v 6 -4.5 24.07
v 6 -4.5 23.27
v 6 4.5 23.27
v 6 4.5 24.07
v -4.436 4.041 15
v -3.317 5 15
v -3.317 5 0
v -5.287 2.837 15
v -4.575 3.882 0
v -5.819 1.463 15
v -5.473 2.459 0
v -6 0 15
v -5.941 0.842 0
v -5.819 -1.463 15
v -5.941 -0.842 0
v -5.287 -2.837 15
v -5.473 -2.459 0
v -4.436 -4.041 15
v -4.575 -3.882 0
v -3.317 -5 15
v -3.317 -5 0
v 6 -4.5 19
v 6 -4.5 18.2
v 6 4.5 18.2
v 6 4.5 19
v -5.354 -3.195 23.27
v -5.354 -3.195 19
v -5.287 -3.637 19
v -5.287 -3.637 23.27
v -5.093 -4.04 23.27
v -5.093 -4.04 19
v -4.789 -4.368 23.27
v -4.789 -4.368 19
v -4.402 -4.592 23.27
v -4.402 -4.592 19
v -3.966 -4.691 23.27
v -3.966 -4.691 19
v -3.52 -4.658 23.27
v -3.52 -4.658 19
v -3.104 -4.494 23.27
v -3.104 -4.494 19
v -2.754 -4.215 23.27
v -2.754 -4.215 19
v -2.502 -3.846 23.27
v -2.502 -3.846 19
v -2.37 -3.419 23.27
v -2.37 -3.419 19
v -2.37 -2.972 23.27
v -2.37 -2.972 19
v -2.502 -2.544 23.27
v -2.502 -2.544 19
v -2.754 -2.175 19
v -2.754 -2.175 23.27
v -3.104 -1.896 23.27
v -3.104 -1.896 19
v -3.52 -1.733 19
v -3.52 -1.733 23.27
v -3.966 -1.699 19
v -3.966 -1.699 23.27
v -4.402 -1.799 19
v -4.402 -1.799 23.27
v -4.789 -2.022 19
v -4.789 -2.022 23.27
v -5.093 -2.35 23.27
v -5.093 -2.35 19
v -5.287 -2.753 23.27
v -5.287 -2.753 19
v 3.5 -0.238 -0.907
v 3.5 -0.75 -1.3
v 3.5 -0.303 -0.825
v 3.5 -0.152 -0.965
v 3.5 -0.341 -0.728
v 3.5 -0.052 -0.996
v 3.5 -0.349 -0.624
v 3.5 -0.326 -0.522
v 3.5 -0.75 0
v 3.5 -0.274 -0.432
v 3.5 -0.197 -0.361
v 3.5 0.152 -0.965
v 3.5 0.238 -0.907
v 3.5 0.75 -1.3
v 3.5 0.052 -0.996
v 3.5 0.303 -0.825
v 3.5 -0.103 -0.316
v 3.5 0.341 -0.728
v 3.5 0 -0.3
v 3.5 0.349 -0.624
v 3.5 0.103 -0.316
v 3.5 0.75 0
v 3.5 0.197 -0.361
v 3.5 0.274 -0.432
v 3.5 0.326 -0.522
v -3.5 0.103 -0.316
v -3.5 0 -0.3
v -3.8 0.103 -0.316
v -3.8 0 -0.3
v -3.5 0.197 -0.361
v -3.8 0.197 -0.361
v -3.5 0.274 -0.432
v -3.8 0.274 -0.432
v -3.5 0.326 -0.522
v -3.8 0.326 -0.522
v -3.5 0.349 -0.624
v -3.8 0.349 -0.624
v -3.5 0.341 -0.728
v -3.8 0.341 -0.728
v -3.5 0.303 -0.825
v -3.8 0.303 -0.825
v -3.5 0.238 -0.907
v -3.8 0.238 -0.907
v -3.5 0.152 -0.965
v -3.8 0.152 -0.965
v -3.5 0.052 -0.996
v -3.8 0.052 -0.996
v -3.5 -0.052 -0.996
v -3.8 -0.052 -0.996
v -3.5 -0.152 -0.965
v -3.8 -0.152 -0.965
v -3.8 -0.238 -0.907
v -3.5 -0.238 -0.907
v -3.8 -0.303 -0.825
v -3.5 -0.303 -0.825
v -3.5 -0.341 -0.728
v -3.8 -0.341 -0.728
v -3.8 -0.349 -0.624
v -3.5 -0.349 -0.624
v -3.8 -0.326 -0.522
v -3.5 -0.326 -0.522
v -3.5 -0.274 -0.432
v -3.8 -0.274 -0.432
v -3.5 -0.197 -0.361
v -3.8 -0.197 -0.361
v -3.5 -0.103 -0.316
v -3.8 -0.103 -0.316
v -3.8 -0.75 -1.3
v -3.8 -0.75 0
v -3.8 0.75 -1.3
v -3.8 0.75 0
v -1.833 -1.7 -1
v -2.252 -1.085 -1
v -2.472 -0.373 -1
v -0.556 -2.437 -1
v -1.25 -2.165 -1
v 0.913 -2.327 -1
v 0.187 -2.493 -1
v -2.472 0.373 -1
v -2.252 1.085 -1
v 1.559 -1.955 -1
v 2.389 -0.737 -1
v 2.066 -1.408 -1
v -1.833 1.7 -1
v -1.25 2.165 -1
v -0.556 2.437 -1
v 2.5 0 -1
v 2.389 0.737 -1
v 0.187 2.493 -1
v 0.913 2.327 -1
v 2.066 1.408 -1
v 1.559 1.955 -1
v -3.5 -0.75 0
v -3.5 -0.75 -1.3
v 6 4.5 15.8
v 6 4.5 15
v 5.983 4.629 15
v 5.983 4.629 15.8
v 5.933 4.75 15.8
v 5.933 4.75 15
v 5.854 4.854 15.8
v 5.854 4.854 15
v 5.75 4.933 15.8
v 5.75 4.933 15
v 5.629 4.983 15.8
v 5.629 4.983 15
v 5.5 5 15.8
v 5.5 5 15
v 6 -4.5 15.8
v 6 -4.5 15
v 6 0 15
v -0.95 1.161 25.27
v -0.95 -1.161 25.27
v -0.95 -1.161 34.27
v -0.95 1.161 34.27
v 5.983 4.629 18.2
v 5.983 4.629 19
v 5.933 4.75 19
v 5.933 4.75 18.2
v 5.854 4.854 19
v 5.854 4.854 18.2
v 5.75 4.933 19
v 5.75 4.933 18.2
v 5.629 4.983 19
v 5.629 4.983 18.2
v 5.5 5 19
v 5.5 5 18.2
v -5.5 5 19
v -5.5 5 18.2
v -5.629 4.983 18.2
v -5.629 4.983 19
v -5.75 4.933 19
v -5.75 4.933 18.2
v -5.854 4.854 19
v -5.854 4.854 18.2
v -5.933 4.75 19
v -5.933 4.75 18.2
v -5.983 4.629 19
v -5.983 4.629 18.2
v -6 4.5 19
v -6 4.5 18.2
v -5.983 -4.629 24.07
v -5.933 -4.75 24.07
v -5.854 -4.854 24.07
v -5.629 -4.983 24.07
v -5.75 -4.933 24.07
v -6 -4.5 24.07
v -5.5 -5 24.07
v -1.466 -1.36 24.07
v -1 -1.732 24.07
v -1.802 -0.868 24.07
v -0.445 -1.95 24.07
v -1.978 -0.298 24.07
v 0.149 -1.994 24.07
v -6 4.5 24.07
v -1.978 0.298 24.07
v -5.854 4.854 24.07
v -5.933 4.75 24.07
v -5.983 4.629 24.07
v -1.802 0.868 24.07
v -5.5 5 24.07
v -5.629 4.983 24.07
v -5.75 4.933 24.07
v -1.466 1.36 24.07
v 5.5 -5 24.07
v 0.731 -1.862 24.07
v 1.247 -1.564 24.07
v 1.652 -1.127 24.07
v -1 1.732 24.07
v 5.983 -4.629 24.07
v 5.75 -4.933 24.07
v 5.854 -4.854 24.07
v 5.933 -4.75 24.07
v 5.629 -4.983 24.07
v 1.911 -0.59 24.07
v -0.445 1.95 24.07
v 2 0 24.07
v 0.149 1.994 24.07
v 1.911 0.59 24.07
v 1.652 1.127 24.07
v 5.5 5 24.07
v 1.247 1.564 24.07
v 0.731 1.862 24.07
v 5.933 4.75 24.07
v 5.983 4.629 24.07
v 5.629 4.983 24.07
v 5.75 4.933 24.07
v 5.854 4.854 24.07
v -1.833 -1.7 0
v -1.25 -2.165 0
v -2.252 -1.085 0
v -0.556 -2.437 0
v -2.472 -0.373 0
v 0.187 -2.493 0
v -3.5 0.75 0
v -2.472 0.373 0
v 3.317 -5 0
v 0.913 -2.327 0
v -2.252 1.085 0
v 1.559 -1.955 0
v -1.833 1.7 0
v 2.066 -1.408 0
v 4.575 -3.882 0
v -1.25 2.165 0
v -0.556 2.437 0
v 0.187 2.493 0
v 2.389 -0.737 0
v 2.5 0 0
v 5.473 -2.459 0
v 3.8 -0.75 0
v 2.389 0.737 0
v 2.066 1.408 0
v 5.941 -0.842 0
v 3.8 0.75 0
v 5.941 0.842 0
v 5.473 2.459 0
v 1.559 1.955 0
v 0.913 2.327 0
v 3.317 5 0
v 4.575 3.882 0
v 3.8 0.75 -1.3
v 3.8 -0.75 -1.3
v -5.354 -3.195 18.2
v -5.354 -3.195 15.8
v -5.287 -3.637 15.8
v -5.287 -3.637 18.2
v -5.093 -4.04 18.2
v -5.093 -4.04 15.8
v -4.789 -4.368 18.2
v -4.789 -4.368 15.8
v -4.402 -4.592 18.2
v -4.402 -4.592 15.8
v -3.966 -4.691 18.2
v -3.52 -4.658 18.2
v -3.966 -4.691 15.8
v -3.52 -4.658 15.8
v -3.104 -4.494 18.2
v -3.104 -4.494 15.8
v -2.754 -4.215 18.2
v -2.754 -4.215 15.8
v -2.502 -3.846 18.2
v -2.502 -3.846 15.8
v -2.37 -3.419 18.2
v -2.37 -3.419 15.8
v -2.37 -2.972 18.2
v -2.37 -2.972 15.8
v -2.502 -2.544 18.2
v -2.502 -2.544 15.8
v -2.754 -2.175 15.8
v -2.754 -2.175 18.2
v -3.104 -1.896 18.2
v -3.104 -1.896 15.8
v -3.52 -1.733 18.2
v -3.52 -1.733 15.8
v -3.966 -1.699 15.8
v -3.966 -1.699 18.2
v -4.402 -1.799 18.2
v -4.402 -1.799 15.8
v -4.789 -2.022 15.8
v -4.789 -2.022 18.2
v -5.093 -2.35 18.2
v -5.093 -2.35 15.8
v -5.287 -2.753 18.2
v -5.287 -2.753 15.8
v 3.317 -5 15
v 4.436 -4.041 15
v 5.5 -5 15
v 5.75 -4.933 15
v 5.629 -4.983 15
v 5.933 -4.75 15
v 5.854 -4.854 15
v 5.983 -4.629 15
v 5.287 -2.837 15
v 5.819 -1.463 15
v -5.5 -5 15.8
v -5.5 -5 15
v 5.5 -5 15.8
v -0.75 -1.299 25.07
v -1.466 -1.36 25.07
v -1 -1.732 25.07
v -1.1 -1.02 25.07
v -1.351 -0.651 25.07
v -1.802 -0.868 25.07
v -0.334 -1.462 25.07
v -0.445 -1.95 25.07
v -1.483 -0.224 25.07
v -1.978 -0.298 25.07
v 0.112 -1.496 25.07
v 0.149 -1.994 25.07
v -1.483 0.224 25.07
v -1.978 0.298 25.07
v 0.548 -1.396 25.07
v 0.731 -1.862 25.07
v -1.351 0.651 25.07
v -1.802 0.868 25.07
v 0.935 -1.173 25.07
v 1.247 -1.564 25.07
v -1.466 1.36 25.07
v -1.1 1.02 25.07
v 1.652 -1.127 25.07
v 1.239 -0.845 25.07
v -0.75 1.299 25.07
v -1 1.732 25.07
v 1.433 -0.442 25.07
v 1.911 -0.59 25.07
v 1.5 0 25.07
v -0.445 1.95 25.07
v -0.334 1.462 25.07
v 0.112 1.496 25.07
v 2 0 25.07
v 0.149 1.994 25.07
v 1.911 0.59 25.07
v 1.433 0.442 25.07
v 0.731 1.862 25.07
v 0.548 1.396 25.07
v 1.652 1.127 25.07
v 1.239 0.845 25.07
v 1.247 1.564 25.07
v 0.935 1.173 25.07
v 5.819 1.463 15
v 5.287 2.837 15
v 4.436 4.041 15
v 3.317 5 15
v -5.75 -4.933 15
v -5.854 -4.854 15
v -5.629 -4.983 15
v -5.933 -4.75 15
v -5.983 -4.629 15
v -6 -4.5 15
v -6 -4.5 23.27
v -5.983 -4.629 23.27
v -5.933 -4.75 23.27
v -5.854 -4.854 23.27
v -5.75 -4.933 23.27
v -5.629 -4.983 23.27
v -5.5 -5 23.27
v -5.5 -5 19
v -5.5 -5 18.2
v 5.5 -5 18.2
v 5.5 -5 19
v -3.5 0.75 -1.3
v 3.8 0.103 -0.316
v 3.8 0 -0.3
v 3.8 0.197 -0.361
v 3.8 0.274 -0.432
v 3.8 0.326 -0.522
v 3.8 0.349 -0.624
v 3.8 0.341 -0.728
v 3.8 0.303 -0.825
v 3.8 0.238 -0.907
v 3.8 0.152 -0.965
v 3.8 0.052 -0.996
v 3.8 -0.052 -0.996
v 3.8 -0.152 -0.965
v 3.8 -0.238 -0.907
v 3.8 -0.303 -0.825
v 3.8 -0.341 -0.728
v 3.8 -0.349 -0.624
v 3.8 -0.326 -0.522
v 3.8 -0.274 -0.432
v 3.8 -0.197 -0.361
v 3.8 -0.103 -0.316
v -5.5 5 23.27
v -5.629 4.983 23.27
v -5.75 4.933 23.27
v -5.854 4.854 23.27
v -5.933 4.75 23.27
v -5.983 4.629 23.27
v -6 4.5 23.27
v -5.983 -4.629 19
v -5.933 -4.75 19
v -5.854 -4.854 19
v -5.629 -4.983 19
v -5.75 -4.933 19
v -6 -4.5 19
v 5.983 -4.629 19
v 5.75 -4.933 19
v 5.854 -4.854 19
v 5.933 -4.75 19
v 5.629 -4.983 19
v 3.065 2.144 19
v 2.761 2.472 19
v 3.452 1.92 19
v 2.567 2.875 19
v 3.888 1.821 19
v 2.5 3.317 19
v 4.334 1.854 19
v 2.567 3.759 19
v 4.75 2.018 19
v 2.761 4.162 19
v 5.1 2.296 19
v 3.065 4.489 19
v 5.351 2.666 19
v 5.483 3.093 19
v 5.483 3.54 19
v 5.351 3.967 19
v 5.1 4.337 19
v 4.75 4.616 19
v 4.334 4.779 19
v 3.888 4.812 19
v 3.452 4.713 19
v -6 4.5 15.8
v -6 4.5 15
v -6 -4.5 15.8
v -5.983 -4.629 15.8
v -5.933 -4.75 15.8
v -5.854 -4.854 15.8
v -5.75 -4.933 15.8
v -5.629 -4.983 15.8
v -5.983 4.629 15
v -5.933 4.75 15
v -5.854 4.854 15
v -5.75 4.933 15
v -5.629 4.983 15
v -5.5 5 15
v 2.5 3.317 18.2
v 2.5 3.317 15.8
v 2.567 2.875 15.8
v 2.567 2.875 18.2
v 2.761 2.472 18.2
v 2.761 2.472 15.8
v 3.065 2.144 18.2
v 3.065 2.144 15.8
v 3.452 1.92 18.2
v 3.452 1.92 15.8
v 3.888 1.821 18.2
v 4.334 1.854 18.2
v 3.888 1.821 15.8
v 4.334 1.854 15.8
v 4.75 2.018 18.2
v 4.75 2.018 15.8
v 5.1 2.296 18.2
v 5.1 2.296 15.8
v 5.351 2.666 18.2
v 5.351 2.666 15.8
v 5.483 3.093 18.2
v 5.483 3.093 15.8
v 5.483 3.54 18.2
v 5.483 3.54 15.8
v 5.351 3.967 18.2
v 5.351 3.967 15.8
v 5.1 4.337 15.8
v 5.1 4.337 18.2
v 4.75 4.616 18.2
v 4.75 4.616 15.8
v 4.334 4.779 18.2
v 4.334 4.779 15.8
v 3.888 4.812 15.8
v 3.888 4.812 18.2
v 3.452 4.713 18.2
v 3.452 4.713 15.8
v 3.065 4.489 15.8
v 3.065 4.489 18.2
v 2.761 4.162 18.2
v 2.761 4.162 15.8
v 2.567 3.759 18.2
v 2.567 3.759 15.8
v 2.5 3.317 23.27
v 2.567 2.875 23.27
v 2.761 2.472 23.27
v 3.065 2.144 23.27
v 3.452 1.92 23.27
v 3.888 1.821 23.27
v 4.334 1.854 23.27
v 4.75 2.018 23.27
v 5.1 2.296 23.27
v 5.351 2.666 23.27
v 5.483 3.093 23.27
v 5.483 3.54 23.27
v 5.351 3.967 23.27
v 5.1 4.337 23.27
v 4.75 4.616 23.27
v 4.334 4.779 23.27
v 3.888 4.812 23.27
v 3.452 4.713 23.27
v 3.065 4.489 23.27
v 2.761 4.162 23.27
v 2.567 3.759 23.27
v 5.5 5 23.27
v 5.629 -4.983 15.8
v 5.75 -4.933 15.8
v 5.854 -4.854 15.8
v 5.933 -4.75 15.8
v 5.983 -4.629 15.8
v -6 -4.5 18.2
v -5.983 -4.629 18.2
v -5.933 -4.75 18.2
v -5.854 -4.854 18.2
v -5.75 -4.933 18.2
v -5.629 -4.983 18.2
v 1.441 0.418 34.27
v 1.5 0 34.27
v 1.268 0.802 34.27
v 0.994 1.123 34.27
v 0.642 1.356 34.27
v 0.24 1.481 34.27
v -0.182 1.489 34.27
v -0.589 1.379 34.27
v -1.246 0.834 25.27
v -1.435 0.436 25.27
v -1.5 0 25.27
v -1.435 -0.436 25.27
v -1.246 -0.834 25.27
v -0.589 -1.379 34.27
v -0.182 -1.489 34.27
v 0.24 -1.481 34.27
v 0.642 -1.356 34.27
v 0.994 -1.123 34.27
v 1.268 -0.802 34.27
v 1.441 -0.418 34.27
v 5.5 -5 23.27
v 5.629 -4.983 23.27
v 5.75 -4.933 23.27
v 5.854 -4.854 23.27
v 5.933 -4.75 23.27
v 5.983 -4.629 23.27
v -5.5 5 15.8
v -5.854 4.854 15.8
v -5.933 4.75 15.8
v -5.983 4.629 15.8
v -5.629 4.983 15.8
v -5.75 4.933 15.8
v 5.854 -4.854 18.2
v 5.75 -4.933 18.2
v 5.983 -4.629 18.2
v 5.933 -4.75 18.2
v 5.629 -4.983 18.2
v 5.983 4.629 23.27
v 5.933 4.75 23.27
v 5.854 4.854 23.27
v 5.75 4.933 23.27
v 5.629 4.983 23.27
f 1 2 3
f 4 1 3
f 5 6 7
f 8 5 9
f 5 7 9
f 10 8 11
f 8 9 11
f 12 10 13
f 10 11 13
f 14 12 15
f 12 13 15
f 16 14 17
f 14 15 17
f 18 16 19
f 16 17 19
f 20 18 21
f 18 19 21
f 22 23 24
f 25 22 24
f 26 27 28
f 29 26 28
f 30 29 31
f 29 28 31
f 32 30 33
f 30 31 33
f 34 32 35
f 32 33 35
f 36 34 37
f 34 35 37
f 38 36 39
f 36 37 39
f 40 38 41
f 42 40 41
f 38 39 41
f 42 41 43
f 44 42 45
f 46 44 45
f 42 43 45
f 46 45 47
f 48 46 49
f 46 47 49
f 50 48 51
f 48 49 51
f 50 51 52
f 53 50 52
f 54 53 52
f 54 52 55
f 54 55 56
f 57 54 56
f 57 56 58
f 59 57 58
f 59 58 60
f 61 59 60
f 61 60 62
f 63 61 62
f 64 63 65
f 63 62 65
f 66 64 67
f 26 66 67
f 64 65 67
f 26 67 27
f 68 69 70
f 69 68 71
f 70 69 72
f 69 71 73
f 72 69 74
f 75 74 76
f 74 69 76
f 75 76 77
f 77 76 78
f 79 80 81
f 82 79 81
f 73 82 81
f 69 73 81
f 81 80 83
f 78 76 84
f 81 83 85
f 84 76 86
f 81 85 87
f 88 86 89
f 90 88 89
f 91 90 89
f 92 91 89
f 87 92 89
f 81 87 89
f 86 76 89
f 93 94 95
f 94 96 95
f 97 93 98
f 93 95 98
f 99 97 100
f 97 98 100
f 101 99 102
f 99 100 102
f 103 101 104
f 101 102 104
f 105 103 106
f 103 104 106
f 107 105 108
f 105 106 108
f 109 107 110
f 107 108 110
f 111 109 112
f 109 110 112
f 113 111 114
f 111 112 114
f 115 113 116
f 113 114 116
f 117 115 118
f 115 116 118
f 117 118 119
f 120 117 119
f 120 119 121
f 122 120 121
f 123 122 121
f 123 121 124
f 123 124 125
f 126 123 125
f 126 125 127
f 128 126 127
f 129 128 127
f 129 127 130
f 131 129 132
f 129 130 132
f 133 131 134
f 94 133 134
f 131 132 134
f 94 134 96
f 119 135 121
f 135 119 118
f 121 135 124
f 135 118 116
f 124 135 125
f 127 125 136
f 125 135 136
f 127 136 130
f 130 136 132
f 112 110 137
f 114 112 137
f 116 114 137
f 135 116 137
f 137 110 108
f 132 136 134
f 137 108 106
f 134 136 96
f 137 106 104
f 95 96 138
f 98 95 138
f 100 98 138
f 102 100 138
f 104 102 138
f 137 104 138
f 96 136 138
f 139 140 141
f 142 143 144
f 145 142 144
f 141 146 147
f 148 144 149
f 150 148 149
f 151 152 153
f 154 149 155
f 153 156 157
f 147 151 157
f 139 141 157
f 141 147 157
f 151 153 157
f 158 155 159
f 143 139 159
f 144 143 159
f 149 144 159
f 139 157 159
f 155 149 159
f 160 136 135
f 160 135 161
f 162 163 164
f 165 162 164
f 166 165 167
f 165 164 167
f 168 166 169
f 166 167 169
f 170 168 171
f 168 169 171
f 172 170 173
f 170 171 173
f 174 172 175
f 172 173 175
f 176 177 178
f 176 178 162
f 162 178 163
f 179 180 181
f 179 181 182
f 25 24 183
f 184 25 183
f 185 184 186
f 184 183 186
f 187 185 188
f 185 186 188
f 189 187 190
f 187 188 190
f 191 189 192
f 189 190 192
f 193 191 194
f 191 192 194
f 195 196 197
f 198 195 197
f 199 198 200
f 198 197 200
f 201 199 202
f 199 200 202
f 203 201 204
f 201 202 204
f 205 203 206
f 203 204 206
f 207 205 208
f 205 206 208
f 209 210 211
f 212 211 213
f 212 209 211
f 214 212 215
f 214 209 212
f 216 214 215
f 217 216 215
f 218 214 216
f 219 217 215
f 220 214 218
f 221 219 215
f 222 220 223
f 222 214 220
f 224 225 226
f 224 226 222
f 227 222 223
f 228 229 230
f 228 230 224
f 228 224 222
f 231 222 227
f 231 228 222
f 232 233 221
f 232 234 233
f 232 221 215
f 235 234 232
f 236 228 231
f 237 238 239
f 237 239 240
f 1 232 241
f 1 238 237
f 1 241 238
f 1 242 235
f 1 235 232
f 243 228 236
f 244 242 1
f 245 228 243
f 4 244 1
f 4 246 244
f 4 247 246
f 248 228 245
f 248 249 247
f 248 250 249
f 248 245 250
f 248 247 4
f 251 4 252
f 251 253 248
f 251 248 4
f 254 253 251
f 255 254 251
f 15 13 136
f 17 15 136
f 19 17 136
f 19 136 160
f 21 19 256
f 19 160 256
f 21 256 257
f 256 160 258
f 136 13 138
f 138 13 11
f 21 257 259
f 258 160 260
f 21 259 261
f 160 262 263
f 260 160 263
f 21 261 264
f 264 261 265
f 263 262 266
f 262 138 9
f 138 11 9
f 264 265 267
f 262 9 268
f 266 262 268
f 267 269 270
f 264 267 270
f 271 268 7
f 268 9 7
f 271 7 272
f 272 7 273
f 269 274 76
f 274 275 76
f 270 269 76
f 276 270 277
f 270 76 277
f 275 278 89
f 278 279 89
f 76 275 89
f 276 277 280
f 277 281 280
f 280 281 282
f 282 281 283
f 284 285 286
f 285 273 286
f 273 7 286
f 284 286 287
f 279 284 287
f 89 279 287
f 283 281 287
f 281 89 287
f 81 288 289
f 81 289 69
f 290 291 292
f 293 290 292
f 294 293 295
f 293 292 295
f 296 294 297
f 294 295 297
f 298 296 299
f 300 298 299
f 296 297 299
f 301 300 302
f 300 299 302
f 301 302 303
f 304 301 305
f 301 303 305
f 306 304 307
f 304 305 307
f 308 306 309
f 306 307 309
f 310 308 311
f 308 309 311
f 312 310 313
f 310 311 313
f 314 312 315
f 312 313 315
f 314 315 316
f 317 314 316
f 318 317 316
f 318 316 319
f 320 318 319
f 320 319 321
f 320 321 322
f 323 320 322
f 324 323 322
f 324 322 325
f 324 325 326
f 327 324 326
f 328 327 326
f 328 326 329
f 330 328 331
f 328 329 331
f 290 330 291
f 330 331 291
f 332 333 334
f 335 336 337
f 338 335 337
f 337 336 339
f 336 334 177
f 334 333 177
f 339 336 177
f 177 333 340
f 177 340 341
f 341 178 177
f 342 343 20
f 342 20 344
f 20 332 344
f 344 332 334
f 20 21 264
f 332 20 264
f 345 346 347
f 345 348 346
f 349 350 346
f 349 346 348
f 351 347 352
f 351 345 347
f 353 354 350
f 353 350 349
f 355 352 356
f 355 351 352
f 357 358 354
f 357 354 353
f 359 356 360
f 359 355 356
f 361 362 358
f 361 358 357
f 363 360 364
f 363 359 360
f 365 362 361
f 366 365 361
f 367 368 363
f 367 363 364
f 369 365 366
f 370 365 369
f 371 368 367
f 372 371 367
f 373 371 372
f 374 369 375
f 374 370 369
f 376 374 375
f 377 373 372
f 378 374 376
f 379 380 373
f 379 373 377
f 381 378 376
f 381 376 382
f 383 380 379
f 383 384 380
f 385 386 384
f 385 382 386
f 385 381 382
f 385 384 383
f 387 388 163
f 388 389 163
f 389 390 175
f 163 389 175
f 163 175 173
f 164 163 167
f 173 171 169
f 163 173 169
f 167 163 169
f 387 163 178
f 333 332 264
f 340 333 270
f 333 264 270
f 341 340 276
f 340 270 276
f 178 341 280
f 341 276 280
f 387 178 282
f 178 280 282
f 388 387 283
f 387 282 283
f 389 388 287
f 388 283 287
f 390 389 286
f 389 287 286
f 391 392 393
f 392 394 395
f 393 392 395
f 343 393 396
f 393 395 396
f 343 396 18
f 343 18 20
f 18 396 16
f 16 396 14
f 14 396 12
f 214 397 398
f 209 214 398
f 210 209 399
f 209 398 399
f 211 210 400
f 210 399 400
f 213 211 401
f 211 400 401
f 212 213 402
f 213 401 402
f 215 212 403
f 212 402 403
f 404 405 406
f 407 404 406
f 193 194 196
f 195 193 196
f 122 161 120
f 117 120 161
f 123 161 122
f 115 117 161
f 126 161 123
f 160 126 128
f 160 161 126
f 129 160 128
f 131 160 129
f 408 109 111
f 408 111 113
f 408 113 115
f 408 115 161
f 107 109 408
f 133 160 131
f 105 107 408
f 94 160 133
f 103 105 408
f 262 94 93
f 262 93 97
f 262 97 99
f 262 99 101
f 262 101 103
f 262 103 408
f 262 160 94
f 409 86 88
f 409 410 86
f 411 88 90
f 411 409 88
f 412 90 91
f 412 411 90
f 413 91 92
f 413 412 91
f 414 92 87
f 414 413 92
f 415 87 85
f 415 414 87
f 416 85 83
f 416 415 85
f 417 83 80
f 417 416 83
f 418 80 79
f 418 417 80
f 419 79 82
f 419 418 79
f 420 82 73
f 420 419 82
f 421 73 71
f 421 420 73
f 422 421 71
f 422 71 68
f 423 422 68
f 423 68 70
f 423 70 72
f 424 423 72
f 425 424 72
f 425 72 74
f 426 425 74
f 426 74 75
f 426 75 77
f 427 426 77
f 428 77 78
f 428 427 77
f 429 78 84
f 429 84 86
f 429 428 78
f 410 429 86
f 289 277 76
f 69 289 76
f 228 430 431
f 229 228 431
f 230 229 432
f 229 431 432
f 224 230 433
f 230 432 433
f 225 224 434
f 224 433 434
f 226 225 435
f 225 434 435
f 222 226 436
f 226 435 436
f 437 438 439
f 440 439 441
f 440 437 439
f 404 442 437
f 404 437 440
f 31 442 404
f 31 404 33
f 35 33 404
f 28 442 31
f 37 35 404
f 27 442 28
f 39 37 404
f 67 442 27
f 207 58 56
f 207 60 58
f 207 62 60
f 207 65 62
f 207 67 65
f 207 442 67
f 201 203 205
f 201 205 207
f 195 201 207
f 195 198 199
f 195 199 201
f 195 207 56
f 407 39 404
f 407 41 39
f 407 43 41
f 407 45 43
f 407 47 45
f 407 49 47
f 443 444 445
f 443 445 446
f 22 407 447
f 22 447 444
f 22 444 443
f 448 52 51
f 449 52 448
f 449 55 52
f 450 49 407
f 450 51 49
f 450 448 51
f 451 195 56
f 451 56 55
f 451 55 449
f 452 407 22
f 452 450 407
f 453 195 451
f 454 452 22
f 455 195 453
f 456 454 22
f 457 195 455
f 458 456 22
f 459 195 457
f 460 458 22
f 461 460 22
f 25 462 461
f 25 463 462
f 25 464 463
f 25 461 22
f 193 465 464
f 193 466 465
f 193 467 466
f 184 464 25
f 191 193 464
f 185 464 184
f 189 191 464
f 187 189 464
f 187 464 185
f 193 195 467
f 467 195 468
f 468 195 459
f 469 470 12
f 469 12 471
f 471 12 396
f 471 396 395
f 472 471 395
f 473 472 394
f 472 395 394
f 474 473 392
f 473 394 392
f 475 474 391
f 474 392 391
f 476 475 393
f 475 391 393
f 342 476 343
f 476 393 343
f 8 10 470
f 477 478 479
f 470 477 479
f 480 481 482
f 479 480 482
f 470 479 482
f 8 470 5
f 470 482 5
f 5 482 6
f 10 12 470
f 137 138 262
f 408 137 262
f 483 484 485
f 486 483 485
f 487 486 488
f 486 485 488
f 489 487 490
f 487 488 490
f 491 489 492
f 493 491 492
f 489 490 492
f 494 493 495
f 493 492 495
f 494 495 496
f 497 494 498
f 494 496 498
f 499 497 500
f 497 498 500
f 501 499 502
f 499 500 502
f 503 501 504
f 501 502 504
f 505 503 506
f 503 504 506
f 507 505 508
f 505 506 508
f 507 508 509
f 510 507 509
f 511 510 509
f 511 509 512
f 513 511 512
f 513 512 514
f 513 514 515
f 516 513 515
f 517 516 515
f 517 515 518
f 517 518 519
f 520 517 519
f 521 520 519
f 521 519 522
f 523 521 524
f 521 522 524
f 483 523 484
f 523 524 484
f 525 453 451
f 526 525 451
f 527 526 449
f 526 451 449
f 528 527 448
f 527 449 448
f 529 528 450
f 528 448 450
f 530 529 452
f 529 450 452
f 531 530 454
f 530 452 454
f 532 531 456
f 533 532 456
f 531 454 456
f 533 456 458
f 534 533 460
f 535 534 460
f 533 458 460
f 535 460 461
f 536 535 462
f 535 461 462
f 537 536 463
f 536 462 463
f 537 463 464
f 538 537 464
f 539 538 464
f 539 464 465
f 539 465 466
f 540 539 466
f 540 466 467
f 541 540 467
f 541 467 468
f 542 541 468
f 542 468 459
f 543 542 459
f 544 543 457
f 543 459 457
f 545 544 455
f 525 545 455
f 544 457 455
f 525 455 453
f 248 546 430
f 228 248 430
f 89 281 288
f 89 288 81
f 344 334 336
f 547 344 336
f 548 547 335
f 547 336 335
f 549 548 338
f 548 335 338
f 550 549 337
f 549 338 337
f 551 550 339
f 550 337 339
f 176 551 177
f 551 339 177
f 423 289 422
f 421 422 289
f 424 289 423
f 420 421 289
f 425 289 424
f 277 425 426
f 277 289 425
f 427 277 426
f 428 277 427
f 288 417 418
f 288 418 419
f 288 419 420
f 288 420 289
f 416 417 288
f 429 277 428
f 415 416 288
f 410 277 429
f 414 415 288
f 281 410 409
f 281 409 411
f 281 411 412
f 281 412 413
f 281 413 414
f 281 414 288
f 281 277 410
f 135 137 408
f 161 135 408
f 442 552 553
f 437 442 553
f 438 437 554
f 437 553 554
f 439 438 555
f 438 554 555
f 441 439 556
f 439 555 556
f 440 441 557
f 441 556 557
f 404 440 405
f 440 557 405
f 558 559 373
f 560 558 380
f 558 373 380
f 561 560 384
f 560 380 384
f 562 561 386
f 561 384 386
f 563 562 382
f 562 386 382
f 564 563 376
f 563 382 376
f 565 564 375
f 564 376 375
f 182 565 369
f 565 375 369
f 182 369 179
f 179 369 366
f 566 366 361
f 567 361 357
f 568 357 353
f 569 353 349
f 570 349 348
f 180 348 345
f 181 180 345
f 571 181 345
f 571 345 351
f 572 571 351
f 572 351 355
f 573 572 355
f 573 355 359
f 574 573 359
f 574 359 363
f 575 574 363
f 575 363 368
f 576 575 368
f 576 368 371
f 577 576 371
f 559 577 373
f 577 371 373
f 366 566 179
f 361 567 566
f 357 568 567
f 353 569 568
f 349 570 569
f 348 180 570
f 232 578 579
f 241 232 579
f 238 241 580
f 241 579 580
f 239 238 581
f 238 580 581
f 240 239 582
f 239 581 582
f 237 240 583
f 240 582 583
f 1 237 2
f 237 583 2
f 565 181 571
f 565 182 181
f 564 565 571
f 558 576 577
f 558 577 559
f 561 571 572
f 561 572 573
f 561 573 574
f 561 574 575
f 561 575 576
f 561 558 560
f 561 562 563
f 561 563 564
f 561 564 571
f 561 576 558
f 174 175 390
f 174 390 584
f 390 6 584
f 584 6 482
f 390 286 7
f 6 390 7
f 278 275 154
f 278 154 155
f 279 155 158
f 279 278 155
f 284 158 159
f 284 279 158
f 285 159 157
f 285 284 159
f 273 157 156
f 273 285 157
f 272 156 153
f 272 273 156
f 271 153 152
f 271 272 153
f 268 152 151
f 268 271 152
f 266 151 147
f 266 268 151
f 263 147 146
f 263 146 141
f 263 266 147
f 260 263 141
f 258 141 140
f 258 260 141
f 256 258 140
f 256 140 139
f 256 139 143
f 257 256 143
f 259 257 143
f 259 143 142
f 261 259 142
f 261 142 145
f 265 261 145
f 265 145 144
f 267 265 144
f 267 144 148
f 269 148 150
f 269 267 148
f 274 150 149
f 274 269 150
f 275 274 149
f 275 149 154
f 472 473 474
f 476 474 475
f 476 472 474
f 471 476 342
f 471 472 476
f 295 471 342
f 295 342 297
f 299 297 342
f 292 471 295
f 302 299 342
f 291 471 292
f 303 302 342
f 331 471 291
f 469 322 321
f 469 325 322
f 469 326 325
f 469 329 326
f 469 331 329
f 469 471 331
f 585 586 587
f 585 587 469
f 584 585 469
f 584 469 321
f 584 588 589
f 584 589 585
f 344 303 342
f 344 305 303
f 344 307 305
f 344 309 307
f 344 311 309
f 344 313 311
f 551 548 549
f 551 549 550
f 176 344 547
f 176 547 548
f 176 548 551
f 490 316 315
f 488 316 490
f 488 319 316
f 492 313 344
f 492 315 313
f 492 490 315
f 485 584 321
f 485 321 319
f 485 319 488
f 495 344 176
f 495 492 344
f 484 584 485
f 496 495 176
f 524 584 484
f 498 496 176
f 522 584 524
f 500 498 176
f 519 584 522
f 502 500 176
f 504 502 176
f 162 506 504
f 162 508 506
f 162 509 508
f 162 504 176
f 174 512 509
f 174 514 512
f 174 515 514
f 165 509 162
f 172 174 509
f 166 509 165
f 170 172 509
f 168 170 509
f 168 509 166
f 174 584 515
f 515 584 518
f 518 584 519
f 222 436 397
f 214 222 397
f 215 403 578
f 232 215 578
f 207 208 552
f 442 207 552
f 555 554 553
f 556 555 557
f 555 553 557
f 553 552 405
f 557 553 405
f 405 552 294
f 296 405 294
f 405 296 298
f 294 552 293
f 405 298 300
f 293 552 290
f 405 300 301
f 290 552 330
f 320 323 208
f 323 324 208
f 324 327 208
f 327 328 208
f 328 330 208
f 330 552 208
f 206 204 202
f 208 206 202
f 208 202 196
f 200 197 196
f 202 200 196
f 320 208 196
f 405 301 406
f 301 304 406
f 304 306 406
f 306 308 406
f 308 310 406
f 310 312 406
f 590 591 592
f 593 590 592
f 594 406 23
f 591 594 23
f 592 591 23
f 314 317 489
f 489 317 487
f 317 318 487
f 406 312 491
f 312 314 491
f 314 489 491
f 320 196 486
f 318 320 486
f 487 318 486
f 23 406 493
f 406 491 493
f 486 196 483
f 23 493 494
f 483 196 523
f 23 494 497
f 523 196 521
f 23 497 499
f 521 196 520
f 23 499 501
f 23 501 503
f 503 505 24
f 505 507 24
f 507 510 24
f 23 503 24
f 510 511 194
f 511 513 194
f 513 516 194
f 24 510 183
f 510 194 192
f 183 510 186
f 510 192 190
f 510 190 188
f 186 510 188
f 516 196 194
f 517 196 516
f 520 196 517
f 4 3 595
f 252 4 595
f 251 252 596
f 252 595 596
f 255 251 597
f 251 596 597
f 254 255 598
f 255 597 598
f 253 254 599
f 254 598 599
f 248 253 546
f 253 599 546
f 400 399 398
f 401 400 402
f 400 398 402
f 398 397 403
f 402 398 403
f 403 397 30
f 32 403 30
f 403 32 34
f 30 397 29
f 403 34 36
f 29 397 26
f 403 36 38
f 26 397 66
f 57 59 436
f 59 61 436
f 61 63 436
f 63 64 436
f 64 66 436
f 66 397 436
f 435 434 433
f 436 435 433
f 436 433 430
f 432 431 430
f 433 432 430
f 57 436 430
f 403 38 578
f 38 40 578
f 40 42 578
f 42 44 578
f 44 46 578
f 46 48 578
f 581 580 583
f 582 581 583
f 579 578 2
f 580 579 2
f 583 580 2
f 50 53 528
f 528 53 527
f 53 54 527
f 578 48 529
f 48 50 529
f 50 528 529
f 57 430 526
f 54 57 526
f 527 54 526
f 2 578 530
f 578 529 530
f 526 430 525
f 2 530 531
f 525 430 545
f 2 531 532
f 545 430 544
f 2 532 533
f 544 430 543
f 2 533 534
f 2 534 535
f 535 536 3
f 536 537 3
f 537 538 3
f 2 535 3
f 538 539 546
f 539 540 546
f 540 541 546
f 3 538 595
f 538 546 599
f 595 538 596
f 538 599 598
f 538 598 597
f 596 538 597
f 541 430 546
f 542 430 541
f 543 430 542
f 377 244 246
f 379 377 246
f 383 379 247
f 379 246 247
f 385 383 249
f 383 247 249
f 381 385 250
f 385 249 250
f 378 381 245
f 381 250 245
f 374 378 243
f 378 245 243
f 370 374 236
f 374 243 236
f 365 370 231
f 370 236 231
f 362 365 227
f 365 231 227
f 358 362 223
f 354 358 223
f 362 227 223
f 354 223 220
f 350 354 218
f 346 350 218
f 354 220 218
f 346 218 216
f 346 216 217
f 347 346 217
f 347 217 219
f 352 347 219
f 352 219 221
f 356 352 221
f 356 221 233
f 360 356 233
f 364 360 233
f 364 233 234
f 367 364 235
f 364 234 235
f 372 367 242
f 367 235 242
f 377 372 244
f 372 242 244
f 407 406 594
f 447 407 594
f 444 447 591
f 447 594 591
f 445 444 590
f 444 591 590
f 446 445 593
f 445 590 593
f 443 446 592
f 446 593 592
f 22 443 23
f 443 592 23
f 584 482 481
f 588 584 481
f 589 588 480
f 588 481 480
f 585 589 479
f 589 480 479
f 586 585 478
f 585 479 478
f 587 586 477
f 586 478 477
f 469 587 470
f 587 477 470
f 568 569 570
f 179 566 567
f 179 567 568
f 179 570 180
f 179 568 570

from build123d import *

# Parameters (mm, degrees)
SALIENTE_EXTRUIR1_DEPTH  = 15
SALIENTE_EXTRUIR2_DEPTH  = 0.8
CROQUIS3_R               = 1.5
SALIENTE_EXTRUIR3_DEPTH  = 2.4
SALIENTE_EXTRUIR4_DEPTH  = 0.8
CROQUIS5_R               = 1.5
SALIENTE_EXTRUIR5_DEPTH  = 4.27
SALIENTE_EXTRUIR6_DEPTH  = 0.8
CROQUIS7_R               = 2
SALIENTE_EXTRUIR7_DEPTH  = 1
CROQUIS8_R               = 1.5
SALIENTE_EXTRUIR8_DEPTH  = 9.2
CORTAR_EXTRUIR1_START    = -9
CORTAR_EXTRUIR1_DEPTH    = 9
CROQUIS1_3_R             = 2.5
SALIENTE_EXTRUIR9_DEPTH  = 1
CROQUIS1_4_W             = 0.3
CROQUIS1_4_H             = 1.5
SALIENTE_EXTRUIR10_DEPTH = 1.3
CORTAR_EXTRUIR2_REACH    = 37.993
CROQUIS10_R              = 0.35


with BuildPart() as part:
    # Croquis1 → Saliente-Extruir1 (new body)
    with BuildSketch(Plane.XY):
        with BuildLine():
            Line((3.31662479, 5), (-3.31662479, 5))
            ThreePointArc((-3.31662479, 5), (-6, 0), (-3.31662479, -5))
            Line((-3.31662479, -5), (3.31662479, -5))
            ThreePointArc((3.31662479, -5), (6, 0), (3.31662479, 5))
        make_face()
    extrude(amount=SALIENTE_EXTRUIR1_DEPTH)

    # Croquis2 → Saliente-Extruir2 (add)
    with BuildSketch(Plane.XY.offset(15)):
        with BuildLine():
            Line((-5.5, -5), (5.5, -5))
            ThreePointArc((5.5, -5), (5.853553391, -4.853553391), (6, -4.5))
            Line((6, -4.5), (6, 4.5))
            ThreePointArc((6, 4.5), (5.853553391, 4.853553391), (5.5, 5))
            Line((5.5, 5), (-5.5, 5))
            ThreePointArc((-5.5, 5), (-5.853553391, 4.853553391), (-6, 4.5))
            Line((-6, 4.5), (-6, -4.5))
            ThreePointArc((-6, -4.5), (-5.853553391, -4.853553391), (-5.5, -5))
        make_face()
    extrude(amount=SALIENTE_EXTRUIR2_DEPTH)

    # Croquis3 → Saliente-Extruir3 (add)
    with BuildSketch(Plane.XY.offset(15.8)):
        with Locations((-3.853553391, -3.195226195)):
            Circle(CROQUIS3_R)
        with Locations((4, 3.316654392)):
            Circle(CROQUIS3_R)
    extrude(amount=SALIENTE_EXTRUIR3_DEPTH)

    # Croquis4 → Saliente-Extruir4 (add)
    with BuildSketch(Plane.XY.offset(18.2)):
        with BuildLine():
            Line((5.5, 5), (-5.5, 5))
            ThreePointArc((-5.5, 5), (-5.853553391, 4.853553391), (-6, 4.5))
            Line((-6, 4.5), (-6, -4.5))
            ThreePointArc((-6, -4.5), (-5.853553391, -4.853553391), (-5.5, -5))
            Line((-5.5, -5), (5.5, -5))
            ThreePointArc((5.5, -5), (5.853553391, -4.853553391), (6, -4.5))
            Line((6, -4.5), (6, 4.5))
            ThreePointArc((6, 4.5), (5.853553391, 4.853553391), (5.5, 5))
        make_face()
    extrude(amount=SALIENTE_EXTRUIR4_DEPTH)

    # Croquis5 → Saliente-Extruir5 (add)
    with BuildSketch(Plane.XY.offset(19)):
        with Locations((4, 3.316654392)):
            Circle(CROQUIS5_R)
        with Locations((-3.853553391, -3.195226195)):
            Circle(CROQUIS5_R)
    extrude(amount=SALIENTE_EXTRUIR5_DEPTH)

    # Croquis6 → Saliente-Extruir6 (add)
    with BuildSketch(Plane.XY.offset(23.27)):
        with BuildLine():
            Line((5.5, 5), (-5.5, 5))
            ThreePointArc((-5.5, 5), (-5.853553391, 4.853553391), (-6, 4.5))
            Line((-6, 4.5), (-6, -4.5))
            ThreePointArc((-6, -4.5), (-5.853553391, -4.853553391), (-5.5, -5))
            Line((-5.5, -5), (5.5, -5))
            ThreePointArc((5.5, -5), (5.853553391, -4.853553391), (6, -4.5))
            Line((6, -4.5), (6, 4.5))
            ThreePointArc((6, 4.5), (5.853553391, 4.853553391), (5.5, 5))
        make_face()
    extrude(amount=SALIENTE_EXTRUIR6_DEPTH)

    # Croquis7 → Saliente-Extruir7 (add)
    with BuildSketch(Plane.XY.offset(24.07)):
        Circle(CROQUIS7_R)
    extrude(amount=SALIENTE_EXTRUIR7_DEPTH)

    # Croquis8 → Saliente-Extruir8 (add)
    with BuildSketch(Plane.XY.offset(25.07)):
        Circle(CROQUIS8_R)
    extrude(amount=SALIENTE_EXTRUIR8_DEPTH)

    # Croquis9 → Cortar-Extruir1 (cut)
    with BuildSketch(Plane.XY.offset(34.27).offset(CORTAR_EXTRUIR1_START)):
        with BuildLine():
            Line((-0.95, -1.160818677), (-0.95, 1.160818677))
            ThreePointArc((-0.95, 1.160818677), (-1.5, 0), (-0.95, -1.160818677))
        make_face()
    extrude(amount=CORTAR_EXTRUIR1_DEPTH, mode=Mode.SUBTRACT)

    # Croquis1<3> → Saliente-Extruir9 (add)
    with BuildSketch(Plane.XY):
        Circle(CROQUIS1_3_R)
    extrude(amount=-SALIENTE_EXTRUIR9_DEPTH)

    # Croquis1<4> → Saliente-Extruir10 (add)
    with BuildSketch(Plane.XY):
        with Locations((-3.65, 0)):
            Rectangle(CROQUIS1_4_W, CROQUIS1_4_H)
    saliente_extruir10 = extrude(amount=-SALIENTE_EXTRUIR10_DEPTH)

    # Croquis10 → Cortar-Extruir2 (cut, up to next)
    with BuildSketch(Plane.ZY.offset(3.8), mode=Mode.PRIVATE) as cortar_extruir2_sk1:
        with Locations((-0.65, 0)):
            Circle(CROQUIS10_R)
    cortar_extruir2_tool1 = extrude(cortar_extruir2_sk1.sketch, amount=-CORTAR_EXTRUIR2_REACH, mode=Mode.PRIVATE) & part.part
    cortar_extruir2 = cortar_extruir2_tool1.solids().sort_by_distance((-3.8, 0, -0.65))[0]
    add(cortar_extruir2, mode=Mode.SUBTRACT)

    # Simetría1: Saliente-Extruir10, Cortar-Extruir2 across plane
    add(saliente_extruir10.mirror(Plane(origin=(0, 0, 0), x_dir=(0, 0, 1), z_dir=(1, 0, 0))))
    add(cortar_extruir2.mirror(Plane(origin=(0, 0, 0), x_dir=(0, 0, 1), z_dir=(1, 0, 0))), mode=Mode.SUBTRACT)


solid = part.part
